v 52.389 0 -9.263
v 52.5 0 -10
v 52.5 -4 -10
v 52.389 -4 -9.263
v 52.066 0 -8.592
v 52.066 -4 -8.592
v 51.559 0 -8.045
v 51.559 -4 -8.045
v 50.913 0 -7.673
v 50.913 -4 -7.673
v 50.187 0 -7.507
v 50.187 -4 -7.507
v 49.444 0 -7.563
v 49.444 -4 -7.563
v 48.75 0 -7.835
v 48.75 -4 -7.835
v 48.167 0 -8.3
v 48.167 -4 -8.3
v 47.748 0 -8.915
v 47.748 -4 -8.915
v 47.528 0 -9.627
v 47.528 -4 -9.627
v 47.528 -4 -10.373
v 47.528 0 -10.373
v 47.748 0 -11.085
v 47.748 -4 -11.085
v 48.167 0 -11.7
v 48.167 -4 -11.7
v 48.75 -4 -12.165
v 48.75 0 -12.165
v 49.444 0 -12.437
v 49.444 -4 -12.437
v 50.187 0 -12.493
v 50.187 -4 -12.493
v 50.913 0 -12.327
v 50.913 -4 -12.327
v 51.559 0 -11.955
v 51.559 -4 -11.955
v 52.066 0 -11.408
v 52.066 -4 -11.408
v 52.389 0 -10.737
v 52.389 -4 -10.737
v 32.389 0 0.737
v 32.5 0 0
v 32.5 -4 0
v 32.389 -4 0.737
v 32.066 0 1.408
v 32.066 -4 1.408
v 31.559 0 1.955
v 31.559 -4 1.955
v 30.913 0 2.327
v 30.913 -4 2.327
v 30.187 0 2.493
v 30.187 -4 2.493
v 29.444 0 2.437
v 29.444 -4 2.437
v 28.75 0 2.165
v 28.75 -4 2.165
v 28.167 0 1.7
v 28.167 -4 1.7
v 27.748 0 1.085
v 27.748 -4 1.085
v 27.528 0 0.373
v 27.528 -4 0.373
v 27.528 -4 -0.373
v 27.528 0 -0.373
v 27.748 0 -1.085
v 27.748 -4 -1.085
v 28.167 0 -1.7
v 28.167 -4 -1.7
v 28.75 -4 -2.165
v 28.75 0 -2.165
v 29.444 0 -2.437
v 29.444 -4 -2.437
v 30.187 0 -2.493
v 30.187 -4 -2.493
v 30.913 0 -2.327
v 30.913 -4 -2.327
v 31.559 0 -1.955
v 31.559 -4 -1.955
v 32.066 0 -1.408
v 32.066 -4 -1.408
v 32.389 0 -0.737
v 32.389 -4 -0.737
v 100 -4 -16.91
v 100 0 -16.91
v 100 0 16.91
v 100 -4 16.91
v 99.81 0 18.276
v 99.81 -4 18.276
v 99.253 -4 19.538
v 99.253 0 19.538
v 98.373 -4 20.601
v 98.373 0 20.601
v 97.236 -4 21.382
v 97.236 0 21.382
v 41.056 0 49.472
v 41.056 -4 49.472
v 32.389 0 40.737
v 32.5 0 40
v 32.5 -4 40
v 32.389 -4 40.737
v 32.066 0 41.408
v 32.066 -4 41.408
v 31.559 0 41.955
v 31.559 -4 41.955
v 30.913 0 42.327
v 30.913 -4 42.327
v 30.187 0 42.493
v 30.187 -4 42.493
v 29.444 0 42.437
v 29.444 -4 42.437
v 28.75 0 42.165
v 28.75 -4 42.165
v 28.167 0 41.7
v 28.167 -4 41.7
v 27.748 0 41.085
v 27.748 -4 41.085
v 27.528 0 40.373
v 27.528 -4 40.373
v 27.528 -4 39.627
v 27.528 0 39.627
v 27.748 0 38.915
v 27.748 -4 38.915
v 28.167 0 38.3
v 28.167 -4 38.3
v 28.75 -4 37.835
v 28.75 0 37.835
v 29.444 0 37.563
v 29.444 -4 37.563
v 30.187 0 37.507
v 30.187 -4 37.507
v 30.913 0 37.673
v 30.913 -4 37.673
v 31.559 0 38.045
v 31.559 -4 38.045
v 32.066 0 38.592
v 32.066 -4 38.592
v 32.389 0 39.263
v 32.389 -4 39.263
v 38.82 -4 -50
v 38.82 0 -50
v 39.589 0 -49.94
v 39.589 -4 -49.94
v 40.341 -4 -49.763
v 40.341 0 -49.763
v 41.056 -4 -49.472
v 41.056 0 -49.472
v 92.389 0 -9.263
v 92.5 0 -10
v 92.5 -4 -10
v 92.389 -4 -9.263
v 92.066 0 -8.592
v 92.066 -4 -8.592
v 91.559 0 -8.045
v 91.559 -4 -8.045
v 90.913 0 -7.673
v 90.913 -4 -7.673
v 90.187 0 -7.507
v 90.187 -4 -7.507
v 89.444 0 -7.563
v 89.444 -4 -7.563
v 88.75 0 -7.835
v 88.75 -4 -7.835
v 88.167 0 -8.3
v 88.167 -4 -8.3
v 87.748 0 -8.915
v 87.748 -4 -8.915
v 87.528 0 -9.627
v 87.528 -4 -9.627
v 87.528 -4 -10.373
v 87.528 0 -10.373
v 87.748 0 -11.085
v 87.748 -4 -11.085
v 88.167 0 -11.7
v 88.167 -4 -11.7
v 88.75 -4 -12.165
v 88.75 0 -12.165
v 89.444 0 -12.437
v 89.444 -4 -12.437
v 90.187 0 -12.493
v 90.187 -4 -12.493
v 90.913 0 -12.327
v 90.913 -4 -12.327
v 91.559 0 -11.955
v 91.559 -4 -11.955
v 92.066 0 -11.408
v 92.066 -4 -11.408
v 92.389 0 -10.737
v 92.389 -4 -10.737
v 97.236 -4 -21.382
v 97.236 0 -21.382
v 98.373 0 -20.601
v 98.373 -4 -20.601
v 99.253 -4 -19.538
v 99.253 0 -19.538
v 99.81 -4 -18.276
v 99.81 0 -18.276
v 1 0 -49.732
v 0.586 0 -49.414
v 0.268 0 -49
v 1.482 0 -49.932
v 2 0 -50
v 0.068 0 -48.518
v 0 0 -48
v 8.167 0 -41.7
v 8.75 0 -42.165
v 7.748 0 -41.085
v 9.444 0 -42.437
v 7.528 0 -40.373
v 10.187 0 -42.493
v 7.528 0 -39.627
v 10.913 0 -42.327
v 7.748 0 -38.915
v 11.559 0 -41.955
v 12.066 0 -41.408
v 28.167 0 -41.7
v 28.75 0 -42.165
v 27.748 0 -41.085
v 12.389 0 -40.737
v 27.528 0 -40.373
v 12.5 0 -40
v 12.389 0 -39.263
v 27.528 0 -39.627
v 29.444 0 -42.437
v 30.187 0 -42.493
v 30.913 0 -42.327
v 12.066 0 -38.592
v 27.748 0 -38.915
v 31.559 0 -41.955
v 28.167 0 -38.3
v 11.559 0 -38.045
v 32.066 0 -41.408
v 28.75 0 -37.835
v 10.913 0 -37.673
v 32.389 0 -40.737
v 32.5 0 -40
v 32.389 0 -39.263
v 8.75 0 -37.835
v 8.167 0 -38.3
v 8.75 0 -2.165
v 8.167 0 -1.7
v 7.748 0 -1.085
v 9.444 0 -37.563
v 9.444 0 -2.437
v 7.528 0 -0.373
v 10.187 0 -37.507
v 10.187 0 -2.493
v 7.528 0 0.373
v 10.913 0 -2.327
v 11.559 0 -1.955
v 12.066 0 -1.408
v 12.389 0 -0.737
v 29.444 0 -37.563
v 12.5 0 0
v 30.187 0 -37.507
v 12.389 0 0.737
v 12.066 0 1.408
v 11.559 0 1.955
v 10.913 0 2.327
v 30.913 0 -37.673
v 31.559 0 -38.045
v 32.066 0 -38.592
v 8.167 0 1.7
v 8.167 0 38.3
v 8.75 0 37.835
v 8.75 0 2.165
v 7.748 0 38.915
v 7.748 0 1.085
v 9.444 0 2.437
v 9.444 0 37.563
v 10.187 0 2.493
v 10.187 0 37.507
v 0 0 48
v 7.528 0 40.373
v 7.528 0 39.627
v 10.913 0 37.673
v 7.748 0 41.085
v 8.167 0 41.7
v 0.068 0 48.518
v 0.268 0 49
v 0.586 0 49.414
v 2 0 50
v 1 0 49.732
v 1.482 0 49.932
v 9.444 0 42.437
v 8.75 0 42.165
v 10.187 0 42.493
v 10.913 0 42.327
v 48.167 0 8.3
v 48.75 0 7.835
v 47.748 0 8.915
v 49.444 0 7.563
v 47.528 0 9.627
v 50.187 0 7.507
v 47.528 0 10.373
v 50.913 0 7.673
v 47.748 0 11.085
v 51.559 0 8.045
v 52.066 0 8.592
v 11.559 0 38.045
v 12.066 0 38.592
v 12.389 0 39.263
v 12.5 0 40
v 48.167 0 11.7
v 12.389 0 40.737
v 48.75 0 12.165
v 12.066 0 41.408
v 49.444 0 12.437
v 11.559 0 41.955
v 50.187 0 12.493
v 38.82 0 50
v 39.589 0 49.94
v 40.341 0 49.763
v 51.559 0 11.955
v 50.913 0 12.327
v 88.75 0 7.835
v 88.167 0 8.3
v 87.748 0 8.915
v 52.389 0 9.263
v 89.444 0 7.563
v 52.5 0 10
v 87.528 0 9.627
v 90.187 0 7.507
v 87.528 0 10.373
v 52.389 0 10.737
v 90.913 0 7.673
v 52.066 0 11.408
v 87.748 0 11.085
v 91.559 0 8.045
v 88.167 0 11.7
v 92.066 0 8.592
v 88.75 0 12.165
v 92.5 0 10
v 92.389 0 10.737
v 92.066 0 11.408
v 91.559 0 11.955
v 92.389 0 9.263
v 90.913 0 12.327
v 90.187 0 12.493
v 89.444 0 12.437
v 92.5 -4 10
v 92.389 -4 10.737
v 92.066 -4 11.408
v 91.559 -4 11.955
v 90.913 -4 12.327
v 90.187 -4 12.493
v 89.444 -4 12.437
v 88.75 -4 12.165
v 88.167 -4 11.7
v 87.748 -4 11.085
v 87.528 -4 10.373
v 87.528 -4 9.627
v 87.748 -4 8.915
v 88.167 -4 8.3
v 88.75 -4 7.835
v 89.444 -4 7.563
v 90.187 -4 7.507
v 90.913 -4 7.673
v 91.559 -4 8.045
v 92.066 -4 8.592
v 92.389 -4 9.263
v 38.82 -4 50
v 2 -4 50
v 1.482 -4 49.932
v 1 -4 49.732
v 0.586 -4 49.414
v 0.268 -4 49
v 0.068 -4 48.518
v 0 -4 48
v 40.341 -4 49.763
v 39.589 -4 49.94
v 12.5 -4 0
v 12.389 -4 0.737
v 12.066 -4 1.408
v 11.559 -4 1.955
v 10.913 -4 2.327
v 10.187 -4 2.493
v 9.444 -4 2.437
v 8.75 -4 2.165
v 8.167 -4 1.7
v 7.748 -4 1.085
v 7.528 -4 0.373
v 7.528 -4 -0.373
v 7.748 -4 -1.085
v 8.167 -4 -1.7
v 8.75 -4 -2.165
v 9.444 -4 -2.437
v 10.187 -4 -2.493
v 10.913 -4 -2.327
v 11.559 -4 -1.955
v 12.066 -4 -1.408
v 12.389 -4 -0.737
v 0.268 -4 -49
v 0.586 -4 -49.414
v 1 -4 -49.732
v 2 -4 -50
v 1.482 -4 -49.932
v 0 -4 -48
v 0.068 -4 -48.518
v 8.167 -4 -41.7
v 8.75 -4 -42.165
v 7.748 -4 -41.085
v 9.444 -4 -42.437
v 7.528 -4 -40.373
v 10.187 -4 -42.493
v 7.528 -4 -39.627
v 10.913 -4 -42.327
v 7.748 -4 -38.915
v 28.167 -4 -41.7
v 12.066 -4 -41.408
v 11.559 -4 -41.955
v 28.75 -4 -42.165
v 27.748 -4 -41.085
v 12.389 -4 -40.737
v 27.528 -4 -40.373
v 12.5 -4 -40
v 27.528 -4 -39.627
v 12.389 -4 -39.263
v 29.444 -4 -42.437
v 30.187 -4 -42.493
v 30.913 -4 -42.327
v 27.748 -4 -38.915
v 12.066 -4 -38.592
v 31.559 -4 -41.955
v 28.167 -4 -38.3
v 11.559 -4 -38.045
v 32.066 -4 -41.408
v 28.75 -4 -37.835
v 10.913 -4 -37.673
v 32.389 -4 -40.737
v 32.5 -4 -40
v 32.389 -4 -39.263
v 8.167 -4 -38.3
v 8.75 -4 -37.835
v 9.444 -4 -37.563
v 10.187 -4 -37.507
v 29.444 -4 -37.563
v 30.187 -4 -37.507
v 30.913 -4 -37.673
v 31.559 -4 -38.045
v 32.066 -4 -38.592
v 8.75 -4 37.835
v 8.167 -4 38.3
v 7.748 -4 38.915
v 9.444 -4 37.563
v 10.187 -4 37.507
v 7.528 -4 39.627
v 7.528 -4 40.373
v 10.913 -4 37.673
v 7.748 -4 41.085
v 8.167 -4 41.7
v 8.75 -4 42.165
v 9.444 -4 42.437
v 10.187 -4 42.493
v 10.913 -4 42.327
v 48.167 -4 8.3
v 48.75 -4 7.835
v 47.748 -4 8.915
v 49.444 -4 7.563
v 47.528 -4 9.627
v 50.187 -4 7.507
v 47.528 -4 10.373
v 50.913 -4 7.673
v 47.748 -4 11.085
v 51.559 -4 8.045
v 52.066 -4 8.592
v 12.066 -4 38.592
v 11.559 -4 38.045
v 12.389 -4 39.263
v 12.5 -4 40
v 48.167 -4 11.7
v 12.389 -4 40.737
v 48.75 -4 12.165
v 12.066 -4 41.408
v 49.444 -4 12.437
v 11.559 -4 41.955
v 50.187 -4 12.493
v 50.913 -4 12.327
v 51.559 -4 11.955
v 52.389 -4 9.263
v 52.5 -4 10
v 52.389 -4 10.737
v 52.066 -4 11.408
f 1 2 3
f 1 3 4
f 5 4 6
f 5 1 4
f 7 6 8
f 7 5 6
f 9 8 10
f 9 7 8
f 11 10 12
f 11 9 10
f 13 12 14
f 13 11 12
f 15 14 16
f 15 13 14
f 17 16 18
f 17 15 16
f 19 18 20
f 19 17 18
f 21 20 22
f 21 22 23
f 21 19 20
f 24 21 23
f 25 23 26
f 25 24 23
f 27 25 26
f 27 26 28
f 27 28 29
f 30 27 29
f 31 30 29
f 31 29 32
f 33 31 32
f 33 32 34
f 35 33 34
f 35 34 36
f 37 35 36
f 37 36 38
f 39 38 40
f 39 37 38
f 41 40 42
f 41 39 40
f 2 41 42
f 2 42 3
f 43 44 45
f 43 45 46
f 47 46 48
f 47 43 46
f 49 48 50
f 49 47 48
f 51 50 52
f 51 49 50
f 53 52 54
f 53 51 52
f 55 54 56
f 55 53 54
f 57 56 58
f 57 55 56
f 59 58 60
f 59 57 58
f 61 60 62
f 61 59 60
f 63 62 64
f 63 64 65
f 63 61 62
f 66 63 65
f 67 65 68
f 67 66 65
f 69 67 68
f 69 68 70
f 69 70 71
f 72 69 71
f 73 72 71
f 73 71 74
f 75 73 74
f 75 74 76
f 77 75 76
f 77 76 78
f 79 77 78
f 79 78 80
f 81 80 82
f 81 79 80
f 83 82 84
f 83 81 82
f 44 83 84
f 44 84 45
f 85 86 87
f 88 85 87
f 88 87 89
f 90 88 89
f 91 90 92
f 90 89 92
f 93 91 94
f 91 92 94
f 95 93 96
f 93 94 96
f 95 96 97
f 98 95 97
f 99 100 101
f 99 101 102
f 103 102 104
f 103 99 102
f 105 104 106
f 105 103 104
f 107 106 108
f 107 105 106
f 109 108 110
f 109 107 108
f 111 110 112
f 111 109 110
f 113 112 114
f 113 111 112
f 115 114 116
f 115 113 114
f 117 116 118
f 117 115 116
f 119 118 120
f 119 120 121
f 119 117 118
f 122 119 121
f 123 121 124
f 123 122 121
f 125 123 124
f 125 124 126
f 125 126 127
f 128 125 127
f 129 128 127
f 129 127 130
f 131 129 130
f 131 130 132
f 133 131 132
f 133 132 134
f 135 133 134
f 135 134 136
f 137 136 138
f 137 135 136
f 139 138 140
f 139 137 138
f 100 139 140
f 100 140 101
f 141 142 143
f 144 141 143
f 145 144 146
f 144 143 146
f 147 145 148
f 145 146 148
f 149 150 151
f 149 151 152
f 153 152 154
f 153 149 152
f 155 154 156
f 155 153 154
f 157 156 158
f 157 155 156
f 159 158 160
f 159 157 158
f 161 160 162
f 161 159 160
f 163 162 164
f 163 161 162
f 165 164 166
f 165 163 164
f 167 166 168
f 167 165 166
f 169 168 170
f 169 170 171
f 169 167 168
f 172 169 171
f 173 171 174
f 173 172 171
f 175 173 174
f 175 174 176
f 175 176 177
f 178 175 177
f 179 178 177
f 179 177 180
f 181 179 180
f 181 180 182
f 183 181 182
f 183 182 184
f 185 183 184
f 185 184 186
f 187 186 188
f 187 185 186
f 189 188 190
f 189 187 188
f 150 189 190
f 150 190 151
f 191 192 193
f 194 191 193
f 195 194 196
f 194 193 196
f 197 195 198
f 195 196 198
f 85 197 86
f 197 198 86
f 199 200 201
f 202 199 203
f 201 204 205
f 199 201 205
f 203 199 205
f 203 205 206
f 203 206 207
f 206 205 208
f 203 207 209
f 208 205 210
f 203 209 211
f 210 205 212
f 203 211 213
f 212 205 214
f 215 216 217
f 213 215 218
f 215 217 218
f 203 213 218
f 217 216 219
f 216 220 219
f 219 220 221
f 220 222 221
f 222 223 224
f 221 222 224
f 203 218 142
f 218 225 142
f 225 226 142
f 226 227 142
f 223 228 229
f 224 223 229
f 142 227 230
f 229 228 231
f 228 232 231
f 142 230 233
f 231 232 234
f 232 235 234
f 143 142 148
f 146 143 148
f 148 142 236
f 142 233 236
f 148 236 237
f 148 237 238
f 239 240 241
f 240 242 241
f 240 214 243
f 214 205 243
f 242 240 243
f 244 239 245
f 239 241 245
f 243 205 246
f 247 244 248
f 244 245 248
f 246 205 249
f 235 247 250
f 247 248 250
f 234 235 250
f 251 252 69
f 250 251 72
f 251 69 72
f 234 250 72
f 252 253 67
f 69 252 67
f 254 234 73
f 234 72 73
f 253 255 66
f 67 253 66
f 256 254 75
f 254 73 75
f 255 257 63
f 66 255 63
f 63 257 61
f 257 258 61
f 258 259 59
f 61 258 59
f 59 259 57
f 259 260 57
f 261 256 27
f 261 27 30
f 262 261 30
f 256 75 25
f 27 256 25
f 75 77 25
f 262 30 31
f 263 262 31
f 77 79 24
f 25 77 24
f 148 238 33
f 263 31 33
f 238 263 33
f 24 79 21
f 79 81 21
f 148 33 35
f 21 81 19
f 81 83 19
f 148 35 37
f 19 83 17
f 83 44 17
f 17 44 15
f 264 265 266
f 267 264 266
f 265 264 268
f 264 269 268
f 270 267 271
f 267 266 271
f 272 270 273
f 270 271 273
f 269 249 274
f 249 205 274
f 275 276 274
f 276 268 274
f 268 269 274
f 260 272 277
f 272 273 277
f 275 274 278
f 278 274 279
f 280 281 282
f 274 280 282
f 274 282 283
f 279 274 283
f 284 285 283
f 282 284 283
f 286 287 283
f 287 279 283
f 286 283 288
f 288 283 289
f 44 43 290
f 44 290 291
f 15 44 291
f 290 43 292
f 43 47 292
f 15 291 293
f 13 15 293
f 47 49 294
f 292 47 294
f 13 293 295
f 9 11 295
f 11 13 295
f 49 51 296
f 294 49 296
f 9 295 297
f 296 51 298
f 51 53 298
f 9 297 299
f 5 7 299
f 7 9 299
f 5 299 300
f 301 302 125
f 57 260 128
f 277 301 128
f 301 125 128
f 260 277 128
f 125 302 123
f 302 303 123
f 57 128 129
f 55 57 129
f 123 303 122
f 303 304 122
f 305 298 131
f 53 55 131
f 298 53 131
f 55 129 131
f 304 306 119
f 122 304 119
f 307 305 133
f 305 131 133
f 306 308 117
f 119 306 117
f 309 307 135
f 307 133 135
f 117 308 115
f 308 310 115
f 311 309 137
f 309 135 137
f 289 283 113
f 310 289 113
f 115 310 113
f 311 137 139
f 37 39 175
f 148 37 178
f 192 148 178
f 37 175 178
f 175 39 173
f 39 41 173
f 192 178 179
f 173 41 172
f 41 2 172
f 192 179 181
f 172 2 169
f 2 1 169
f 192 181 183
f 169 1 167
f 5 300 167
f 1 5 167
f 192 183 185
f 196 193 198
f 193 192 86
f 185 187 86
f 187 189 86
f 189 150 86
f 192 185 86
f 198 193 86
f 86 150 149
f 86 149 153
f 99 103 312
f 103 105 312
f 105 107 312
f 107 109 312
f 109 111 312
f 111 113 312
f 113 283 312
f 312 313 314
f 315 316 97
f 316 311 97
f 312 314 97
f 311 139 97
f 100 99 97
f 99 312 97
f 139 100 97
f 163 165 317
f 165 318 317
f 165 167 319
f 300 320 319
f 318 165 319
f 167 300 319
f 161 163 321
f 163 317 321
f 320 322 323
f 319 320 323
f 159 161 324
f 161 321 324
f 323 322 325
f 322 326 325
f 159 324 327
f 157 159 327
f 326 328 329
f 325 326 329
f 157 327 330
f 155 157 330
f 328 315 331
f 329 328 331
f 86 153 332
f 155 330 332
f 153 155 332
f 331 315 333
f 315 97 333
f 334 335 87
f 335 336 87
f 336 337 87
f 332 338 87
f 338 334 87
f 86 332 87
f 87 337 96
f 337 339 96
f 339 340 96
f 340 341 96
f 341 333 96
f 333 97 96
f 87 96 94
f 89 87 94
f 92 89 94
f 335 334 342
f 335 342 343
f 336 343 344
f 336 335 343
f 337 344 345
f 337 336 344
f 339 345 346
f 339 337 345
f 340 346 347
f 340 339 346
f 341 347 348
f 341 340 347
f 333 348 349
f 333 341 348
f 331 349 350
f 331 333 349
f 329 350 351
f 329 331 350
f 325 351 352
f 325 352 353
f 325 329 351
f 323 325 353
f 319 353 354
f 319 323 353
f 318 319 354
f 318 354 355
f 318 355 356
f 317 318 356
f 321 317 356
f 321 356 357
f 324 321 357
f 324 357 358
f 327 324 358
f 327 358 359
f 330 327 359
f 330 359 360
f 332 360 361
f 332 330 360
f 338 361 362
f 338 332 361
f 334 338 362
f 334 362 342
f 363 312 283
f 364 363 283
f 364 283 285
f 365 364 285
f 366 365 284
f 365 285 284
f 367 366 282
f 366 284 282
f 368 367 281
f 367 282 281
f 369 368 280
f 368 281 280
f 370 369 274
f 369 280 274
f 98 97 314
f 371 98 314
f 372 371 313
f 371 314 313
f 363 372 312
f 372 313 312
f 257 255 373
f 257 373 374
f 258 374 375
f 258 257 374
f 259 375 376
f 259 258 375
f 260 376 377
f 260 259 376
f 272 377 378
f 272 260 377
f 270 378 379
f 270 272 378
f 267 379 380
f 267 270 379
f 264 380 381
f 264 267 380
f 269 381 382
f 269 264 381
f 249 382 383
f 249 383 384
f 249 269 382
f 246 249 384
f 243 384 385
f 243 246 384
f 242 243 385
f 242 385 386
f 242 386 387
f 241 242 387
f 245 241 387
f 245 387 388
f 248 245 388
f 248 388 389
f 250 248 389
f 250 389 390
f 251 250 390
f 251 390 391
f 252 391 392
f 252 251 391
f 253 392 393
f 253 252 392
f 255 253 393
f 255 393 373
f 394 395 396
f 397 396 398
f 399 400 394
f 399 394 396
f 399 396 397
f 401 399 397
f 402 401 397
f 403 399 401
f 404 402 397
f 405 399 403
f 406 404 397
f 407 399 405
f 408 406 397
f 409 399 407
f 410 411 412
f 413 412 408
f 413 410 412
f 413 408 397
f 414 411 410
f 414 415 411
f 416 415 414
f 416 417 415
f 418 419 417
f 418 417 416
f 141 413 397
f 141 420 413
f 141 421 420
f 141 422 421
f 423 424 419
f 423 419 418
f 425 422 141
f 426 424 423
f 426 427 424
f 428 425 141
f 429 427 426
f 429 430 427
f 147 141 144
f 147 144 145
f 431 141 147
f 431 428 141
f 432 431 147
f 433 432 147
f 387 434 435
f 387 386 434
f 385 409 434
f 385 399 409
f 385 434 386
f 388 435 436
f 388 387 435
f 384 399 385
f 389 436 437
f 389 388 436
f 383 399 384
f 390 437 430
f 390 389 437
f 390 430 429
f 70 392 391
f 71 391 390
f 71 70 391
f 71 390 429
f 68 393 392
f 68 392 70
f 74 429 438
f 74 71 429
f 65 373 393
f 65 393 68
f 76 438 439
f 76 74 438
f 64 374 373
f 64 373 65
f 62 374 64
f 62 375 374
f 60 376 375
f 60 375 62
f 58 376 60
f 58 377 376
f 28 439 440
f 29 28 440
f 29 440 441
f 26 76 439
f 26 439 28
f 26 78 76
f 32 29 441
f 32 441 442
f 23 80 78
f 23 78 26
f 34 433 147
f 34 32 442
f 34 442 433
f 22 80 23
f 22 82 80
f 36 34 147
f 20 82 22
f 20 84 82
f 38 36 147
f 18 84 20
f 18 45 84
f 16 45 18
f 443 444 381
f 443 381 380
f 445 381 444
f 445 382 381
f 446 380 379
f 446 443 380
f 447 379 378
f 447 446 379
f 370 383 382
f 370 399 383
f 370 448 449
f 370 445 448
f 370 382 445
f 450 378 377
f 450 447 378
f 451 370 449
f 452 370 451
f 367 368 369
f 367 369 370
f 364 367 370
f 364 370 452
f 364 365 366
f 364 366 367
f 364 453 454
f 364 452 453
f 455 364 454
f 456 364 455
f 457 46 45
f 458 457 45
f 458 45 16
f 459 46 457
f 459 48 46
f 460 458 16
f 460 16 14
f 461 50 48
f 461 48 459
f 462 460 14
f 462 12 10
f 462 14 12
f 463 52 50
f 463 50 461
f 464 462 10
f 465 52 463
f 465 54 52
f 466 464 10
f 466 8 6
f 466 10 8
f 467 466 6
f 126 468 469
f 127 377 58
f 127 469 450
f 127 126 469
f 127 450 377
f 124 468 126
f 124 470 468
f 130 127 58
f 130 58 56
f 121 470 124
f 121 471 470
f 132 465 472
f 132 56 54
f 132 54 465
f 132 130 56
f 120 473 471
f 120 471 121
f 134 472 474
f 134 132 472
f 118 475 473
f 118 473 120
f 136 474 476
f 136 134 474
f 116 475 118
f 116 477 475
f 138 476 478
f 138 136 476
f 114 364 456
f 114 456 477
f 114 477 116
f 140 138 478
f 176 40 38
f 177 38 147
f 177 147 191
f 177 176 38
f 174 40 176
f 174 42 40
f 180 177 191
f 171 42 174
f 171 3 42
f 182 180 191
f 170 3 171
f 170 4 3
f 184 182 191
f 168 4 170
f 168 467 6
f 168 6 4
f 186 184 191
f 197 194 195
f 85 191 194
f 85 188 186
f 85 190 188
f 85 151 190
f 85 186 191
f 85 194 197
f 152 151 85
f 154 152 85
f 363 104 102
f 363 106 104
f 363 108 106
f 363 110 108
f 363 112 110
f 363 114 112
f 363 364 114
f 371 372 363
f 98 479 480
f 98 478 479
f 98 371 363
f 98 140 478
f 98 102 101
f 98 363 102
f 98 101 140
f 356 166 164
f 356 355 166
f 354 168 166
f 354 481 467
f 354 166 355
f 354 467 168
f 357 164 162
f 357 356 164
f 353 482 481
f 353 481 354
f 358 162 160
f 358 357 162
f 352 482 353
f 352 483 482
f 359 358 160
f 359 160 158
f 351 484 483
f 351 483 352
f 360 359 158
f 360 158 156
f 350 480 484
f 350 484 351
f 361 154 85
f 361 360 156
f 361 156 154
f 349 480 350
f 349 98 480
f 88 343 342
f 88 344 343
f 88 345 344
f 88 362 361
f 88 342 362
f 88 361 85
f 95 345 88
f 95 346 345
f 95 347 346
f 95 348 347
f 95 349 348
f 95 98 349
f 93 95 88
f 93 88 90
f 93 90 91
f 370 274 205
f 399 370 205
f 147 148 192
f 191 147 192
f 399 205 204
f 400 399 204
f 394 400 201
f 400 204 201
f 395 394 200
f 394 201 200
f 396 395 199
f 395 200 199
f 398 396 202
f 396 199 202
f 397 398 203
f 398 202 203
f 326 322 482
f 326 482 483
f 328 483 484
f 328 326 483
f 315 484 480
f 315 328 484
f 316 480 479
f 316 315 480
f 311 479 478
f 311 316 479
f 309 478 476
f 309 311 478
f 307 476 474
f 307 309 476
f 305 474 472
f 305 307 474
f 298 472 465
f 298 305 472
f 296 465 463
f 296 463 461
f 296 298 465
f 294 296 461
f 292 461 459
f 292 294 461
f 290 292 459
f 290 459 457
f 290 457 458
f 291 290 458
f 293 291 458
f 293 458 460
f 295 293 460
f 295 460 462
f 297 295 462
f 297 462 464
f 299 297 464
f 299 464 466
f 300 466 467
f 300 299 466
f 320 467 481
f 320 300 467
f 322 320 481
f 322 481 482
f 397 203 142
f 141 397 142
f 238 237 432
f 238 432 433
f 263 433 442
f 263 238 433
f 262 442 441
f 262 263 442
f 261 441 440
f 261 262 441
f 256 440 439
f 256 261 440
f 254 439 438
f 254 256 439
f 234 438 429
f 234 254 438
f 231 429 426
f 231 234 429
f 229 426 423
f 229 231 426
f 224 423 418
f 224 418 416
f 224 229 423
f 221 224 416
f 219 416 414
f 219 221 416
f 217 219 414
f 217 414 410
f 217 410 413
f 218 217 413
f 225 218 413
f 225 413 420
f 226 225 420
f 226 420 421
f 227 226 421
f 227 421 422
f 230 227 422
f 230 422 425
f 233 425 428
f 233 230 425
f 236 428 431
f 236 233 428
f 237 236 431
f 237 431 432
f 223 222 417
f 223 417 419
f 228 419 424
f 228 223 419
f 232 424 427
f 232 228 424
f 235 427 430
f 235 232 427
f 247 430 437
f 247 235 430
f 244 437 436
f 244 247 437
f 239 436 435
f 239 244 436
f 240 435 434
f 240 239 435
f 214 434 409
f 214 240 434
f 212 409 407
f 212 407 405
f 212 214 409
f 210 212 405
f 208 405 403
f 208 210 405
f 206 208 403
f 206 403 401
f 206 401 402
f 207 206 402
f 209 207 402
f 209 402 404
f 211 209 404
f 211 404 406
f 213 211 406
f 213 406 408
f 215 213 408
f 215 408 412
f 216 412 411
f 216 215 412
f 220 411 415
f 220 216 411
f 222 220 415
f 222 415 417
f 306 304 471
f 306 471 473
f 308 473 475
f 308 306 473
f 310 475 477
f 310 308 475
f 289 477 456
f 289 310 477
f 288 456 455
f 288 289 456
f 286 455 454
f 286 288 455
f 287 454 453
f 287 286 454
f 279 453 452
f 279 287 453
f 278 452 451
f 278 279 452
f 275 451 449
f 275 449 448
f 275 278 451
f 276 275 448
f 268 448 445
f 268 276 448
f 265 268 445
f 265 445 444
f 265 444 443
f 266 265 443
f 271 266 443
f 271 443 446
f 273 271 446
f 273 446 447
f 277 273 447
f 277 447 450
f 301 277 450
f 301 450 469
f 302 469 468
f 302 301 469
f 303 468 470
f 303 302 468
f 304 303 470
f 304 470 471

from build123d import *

# Parameters (mm, degrees)
F0_R     = 2.5
F1_DEPTH = 4


with BuildPart() as f1:
    # F0 (on Front) → F1 (new body)
    with BuildSketch(Plane.XZ):
        with BuildLine():
            Line((0, 48), (0, 0))
            Line((0, 0), (0, -48))
            ThreePointArc((0, -48), (0.585786, -49.414214), (2, -50))
            Line((2, -50), (38.81966, -50))
            ThreePointArc((38.81966, -50), (39.968425, -49.866245), (41.055728, -49.472136))
            Line((41.055728, -49.472136), (97.236068, -21.381966))
            ThreePointArc((97.236068, -21.381966), (99.253254, -19.538486), (100, -16.90983))
            Line((100, -16.90983), (100, 0))
            Line((100, 0), (100, 16.90983))
            ThreePointArc((100, 16.90983), (99.253254, 19.538486), (97.236068, 21.381966))
            Line((97.236068, 21.381966), (41.055728, 49.472136))
            ThreePointArc((41.055728, 49.472136), (39.968425, 49.866245), (38.81966, 50))
            Line((38.81966, 50), (2, 50))
            ThreePointArc((2, 50), (0.585786, 49.414214), (0, 48))
        make_face()
        with Locations((10, -40)):
            Circle(F0_R, mode=Mode.SUBTRACT)
        with Locations((30, -40)):
            Circle(F0_R, mode=Mode.SUBTRACT)
        with Locations((50, -10)):
            Circle(F0_R, mode=Mode.SUBTRACT)
        with Locations((90, -10)):
            Circle(F0_R, mode=Mode.SUBTRACT)
        with Locations((10, 0)):
            Circle(F0_R, mode=Mode.SUBTRACT)
        with Locations((30, 0)):
            Circle(F0_R, mode=Mode.SUBTRACT)
        with Locations((10, 40)):
            Circle(F0_R, mode=Mode.SUBTRACT)
        with Locations((30, 40)):
            Circle(F0_R, mode=Mode.SUBTRACT)
        with Locations((50, 10)):
            Circle(F0_R, mode=Mode.SUBTRACT)
        with Locations((90, 10)):
            Circle(F0_R, mode=Mode.SUBTRACT)
    extrude(amount=F1_DEPTH)


solid = f1.part
